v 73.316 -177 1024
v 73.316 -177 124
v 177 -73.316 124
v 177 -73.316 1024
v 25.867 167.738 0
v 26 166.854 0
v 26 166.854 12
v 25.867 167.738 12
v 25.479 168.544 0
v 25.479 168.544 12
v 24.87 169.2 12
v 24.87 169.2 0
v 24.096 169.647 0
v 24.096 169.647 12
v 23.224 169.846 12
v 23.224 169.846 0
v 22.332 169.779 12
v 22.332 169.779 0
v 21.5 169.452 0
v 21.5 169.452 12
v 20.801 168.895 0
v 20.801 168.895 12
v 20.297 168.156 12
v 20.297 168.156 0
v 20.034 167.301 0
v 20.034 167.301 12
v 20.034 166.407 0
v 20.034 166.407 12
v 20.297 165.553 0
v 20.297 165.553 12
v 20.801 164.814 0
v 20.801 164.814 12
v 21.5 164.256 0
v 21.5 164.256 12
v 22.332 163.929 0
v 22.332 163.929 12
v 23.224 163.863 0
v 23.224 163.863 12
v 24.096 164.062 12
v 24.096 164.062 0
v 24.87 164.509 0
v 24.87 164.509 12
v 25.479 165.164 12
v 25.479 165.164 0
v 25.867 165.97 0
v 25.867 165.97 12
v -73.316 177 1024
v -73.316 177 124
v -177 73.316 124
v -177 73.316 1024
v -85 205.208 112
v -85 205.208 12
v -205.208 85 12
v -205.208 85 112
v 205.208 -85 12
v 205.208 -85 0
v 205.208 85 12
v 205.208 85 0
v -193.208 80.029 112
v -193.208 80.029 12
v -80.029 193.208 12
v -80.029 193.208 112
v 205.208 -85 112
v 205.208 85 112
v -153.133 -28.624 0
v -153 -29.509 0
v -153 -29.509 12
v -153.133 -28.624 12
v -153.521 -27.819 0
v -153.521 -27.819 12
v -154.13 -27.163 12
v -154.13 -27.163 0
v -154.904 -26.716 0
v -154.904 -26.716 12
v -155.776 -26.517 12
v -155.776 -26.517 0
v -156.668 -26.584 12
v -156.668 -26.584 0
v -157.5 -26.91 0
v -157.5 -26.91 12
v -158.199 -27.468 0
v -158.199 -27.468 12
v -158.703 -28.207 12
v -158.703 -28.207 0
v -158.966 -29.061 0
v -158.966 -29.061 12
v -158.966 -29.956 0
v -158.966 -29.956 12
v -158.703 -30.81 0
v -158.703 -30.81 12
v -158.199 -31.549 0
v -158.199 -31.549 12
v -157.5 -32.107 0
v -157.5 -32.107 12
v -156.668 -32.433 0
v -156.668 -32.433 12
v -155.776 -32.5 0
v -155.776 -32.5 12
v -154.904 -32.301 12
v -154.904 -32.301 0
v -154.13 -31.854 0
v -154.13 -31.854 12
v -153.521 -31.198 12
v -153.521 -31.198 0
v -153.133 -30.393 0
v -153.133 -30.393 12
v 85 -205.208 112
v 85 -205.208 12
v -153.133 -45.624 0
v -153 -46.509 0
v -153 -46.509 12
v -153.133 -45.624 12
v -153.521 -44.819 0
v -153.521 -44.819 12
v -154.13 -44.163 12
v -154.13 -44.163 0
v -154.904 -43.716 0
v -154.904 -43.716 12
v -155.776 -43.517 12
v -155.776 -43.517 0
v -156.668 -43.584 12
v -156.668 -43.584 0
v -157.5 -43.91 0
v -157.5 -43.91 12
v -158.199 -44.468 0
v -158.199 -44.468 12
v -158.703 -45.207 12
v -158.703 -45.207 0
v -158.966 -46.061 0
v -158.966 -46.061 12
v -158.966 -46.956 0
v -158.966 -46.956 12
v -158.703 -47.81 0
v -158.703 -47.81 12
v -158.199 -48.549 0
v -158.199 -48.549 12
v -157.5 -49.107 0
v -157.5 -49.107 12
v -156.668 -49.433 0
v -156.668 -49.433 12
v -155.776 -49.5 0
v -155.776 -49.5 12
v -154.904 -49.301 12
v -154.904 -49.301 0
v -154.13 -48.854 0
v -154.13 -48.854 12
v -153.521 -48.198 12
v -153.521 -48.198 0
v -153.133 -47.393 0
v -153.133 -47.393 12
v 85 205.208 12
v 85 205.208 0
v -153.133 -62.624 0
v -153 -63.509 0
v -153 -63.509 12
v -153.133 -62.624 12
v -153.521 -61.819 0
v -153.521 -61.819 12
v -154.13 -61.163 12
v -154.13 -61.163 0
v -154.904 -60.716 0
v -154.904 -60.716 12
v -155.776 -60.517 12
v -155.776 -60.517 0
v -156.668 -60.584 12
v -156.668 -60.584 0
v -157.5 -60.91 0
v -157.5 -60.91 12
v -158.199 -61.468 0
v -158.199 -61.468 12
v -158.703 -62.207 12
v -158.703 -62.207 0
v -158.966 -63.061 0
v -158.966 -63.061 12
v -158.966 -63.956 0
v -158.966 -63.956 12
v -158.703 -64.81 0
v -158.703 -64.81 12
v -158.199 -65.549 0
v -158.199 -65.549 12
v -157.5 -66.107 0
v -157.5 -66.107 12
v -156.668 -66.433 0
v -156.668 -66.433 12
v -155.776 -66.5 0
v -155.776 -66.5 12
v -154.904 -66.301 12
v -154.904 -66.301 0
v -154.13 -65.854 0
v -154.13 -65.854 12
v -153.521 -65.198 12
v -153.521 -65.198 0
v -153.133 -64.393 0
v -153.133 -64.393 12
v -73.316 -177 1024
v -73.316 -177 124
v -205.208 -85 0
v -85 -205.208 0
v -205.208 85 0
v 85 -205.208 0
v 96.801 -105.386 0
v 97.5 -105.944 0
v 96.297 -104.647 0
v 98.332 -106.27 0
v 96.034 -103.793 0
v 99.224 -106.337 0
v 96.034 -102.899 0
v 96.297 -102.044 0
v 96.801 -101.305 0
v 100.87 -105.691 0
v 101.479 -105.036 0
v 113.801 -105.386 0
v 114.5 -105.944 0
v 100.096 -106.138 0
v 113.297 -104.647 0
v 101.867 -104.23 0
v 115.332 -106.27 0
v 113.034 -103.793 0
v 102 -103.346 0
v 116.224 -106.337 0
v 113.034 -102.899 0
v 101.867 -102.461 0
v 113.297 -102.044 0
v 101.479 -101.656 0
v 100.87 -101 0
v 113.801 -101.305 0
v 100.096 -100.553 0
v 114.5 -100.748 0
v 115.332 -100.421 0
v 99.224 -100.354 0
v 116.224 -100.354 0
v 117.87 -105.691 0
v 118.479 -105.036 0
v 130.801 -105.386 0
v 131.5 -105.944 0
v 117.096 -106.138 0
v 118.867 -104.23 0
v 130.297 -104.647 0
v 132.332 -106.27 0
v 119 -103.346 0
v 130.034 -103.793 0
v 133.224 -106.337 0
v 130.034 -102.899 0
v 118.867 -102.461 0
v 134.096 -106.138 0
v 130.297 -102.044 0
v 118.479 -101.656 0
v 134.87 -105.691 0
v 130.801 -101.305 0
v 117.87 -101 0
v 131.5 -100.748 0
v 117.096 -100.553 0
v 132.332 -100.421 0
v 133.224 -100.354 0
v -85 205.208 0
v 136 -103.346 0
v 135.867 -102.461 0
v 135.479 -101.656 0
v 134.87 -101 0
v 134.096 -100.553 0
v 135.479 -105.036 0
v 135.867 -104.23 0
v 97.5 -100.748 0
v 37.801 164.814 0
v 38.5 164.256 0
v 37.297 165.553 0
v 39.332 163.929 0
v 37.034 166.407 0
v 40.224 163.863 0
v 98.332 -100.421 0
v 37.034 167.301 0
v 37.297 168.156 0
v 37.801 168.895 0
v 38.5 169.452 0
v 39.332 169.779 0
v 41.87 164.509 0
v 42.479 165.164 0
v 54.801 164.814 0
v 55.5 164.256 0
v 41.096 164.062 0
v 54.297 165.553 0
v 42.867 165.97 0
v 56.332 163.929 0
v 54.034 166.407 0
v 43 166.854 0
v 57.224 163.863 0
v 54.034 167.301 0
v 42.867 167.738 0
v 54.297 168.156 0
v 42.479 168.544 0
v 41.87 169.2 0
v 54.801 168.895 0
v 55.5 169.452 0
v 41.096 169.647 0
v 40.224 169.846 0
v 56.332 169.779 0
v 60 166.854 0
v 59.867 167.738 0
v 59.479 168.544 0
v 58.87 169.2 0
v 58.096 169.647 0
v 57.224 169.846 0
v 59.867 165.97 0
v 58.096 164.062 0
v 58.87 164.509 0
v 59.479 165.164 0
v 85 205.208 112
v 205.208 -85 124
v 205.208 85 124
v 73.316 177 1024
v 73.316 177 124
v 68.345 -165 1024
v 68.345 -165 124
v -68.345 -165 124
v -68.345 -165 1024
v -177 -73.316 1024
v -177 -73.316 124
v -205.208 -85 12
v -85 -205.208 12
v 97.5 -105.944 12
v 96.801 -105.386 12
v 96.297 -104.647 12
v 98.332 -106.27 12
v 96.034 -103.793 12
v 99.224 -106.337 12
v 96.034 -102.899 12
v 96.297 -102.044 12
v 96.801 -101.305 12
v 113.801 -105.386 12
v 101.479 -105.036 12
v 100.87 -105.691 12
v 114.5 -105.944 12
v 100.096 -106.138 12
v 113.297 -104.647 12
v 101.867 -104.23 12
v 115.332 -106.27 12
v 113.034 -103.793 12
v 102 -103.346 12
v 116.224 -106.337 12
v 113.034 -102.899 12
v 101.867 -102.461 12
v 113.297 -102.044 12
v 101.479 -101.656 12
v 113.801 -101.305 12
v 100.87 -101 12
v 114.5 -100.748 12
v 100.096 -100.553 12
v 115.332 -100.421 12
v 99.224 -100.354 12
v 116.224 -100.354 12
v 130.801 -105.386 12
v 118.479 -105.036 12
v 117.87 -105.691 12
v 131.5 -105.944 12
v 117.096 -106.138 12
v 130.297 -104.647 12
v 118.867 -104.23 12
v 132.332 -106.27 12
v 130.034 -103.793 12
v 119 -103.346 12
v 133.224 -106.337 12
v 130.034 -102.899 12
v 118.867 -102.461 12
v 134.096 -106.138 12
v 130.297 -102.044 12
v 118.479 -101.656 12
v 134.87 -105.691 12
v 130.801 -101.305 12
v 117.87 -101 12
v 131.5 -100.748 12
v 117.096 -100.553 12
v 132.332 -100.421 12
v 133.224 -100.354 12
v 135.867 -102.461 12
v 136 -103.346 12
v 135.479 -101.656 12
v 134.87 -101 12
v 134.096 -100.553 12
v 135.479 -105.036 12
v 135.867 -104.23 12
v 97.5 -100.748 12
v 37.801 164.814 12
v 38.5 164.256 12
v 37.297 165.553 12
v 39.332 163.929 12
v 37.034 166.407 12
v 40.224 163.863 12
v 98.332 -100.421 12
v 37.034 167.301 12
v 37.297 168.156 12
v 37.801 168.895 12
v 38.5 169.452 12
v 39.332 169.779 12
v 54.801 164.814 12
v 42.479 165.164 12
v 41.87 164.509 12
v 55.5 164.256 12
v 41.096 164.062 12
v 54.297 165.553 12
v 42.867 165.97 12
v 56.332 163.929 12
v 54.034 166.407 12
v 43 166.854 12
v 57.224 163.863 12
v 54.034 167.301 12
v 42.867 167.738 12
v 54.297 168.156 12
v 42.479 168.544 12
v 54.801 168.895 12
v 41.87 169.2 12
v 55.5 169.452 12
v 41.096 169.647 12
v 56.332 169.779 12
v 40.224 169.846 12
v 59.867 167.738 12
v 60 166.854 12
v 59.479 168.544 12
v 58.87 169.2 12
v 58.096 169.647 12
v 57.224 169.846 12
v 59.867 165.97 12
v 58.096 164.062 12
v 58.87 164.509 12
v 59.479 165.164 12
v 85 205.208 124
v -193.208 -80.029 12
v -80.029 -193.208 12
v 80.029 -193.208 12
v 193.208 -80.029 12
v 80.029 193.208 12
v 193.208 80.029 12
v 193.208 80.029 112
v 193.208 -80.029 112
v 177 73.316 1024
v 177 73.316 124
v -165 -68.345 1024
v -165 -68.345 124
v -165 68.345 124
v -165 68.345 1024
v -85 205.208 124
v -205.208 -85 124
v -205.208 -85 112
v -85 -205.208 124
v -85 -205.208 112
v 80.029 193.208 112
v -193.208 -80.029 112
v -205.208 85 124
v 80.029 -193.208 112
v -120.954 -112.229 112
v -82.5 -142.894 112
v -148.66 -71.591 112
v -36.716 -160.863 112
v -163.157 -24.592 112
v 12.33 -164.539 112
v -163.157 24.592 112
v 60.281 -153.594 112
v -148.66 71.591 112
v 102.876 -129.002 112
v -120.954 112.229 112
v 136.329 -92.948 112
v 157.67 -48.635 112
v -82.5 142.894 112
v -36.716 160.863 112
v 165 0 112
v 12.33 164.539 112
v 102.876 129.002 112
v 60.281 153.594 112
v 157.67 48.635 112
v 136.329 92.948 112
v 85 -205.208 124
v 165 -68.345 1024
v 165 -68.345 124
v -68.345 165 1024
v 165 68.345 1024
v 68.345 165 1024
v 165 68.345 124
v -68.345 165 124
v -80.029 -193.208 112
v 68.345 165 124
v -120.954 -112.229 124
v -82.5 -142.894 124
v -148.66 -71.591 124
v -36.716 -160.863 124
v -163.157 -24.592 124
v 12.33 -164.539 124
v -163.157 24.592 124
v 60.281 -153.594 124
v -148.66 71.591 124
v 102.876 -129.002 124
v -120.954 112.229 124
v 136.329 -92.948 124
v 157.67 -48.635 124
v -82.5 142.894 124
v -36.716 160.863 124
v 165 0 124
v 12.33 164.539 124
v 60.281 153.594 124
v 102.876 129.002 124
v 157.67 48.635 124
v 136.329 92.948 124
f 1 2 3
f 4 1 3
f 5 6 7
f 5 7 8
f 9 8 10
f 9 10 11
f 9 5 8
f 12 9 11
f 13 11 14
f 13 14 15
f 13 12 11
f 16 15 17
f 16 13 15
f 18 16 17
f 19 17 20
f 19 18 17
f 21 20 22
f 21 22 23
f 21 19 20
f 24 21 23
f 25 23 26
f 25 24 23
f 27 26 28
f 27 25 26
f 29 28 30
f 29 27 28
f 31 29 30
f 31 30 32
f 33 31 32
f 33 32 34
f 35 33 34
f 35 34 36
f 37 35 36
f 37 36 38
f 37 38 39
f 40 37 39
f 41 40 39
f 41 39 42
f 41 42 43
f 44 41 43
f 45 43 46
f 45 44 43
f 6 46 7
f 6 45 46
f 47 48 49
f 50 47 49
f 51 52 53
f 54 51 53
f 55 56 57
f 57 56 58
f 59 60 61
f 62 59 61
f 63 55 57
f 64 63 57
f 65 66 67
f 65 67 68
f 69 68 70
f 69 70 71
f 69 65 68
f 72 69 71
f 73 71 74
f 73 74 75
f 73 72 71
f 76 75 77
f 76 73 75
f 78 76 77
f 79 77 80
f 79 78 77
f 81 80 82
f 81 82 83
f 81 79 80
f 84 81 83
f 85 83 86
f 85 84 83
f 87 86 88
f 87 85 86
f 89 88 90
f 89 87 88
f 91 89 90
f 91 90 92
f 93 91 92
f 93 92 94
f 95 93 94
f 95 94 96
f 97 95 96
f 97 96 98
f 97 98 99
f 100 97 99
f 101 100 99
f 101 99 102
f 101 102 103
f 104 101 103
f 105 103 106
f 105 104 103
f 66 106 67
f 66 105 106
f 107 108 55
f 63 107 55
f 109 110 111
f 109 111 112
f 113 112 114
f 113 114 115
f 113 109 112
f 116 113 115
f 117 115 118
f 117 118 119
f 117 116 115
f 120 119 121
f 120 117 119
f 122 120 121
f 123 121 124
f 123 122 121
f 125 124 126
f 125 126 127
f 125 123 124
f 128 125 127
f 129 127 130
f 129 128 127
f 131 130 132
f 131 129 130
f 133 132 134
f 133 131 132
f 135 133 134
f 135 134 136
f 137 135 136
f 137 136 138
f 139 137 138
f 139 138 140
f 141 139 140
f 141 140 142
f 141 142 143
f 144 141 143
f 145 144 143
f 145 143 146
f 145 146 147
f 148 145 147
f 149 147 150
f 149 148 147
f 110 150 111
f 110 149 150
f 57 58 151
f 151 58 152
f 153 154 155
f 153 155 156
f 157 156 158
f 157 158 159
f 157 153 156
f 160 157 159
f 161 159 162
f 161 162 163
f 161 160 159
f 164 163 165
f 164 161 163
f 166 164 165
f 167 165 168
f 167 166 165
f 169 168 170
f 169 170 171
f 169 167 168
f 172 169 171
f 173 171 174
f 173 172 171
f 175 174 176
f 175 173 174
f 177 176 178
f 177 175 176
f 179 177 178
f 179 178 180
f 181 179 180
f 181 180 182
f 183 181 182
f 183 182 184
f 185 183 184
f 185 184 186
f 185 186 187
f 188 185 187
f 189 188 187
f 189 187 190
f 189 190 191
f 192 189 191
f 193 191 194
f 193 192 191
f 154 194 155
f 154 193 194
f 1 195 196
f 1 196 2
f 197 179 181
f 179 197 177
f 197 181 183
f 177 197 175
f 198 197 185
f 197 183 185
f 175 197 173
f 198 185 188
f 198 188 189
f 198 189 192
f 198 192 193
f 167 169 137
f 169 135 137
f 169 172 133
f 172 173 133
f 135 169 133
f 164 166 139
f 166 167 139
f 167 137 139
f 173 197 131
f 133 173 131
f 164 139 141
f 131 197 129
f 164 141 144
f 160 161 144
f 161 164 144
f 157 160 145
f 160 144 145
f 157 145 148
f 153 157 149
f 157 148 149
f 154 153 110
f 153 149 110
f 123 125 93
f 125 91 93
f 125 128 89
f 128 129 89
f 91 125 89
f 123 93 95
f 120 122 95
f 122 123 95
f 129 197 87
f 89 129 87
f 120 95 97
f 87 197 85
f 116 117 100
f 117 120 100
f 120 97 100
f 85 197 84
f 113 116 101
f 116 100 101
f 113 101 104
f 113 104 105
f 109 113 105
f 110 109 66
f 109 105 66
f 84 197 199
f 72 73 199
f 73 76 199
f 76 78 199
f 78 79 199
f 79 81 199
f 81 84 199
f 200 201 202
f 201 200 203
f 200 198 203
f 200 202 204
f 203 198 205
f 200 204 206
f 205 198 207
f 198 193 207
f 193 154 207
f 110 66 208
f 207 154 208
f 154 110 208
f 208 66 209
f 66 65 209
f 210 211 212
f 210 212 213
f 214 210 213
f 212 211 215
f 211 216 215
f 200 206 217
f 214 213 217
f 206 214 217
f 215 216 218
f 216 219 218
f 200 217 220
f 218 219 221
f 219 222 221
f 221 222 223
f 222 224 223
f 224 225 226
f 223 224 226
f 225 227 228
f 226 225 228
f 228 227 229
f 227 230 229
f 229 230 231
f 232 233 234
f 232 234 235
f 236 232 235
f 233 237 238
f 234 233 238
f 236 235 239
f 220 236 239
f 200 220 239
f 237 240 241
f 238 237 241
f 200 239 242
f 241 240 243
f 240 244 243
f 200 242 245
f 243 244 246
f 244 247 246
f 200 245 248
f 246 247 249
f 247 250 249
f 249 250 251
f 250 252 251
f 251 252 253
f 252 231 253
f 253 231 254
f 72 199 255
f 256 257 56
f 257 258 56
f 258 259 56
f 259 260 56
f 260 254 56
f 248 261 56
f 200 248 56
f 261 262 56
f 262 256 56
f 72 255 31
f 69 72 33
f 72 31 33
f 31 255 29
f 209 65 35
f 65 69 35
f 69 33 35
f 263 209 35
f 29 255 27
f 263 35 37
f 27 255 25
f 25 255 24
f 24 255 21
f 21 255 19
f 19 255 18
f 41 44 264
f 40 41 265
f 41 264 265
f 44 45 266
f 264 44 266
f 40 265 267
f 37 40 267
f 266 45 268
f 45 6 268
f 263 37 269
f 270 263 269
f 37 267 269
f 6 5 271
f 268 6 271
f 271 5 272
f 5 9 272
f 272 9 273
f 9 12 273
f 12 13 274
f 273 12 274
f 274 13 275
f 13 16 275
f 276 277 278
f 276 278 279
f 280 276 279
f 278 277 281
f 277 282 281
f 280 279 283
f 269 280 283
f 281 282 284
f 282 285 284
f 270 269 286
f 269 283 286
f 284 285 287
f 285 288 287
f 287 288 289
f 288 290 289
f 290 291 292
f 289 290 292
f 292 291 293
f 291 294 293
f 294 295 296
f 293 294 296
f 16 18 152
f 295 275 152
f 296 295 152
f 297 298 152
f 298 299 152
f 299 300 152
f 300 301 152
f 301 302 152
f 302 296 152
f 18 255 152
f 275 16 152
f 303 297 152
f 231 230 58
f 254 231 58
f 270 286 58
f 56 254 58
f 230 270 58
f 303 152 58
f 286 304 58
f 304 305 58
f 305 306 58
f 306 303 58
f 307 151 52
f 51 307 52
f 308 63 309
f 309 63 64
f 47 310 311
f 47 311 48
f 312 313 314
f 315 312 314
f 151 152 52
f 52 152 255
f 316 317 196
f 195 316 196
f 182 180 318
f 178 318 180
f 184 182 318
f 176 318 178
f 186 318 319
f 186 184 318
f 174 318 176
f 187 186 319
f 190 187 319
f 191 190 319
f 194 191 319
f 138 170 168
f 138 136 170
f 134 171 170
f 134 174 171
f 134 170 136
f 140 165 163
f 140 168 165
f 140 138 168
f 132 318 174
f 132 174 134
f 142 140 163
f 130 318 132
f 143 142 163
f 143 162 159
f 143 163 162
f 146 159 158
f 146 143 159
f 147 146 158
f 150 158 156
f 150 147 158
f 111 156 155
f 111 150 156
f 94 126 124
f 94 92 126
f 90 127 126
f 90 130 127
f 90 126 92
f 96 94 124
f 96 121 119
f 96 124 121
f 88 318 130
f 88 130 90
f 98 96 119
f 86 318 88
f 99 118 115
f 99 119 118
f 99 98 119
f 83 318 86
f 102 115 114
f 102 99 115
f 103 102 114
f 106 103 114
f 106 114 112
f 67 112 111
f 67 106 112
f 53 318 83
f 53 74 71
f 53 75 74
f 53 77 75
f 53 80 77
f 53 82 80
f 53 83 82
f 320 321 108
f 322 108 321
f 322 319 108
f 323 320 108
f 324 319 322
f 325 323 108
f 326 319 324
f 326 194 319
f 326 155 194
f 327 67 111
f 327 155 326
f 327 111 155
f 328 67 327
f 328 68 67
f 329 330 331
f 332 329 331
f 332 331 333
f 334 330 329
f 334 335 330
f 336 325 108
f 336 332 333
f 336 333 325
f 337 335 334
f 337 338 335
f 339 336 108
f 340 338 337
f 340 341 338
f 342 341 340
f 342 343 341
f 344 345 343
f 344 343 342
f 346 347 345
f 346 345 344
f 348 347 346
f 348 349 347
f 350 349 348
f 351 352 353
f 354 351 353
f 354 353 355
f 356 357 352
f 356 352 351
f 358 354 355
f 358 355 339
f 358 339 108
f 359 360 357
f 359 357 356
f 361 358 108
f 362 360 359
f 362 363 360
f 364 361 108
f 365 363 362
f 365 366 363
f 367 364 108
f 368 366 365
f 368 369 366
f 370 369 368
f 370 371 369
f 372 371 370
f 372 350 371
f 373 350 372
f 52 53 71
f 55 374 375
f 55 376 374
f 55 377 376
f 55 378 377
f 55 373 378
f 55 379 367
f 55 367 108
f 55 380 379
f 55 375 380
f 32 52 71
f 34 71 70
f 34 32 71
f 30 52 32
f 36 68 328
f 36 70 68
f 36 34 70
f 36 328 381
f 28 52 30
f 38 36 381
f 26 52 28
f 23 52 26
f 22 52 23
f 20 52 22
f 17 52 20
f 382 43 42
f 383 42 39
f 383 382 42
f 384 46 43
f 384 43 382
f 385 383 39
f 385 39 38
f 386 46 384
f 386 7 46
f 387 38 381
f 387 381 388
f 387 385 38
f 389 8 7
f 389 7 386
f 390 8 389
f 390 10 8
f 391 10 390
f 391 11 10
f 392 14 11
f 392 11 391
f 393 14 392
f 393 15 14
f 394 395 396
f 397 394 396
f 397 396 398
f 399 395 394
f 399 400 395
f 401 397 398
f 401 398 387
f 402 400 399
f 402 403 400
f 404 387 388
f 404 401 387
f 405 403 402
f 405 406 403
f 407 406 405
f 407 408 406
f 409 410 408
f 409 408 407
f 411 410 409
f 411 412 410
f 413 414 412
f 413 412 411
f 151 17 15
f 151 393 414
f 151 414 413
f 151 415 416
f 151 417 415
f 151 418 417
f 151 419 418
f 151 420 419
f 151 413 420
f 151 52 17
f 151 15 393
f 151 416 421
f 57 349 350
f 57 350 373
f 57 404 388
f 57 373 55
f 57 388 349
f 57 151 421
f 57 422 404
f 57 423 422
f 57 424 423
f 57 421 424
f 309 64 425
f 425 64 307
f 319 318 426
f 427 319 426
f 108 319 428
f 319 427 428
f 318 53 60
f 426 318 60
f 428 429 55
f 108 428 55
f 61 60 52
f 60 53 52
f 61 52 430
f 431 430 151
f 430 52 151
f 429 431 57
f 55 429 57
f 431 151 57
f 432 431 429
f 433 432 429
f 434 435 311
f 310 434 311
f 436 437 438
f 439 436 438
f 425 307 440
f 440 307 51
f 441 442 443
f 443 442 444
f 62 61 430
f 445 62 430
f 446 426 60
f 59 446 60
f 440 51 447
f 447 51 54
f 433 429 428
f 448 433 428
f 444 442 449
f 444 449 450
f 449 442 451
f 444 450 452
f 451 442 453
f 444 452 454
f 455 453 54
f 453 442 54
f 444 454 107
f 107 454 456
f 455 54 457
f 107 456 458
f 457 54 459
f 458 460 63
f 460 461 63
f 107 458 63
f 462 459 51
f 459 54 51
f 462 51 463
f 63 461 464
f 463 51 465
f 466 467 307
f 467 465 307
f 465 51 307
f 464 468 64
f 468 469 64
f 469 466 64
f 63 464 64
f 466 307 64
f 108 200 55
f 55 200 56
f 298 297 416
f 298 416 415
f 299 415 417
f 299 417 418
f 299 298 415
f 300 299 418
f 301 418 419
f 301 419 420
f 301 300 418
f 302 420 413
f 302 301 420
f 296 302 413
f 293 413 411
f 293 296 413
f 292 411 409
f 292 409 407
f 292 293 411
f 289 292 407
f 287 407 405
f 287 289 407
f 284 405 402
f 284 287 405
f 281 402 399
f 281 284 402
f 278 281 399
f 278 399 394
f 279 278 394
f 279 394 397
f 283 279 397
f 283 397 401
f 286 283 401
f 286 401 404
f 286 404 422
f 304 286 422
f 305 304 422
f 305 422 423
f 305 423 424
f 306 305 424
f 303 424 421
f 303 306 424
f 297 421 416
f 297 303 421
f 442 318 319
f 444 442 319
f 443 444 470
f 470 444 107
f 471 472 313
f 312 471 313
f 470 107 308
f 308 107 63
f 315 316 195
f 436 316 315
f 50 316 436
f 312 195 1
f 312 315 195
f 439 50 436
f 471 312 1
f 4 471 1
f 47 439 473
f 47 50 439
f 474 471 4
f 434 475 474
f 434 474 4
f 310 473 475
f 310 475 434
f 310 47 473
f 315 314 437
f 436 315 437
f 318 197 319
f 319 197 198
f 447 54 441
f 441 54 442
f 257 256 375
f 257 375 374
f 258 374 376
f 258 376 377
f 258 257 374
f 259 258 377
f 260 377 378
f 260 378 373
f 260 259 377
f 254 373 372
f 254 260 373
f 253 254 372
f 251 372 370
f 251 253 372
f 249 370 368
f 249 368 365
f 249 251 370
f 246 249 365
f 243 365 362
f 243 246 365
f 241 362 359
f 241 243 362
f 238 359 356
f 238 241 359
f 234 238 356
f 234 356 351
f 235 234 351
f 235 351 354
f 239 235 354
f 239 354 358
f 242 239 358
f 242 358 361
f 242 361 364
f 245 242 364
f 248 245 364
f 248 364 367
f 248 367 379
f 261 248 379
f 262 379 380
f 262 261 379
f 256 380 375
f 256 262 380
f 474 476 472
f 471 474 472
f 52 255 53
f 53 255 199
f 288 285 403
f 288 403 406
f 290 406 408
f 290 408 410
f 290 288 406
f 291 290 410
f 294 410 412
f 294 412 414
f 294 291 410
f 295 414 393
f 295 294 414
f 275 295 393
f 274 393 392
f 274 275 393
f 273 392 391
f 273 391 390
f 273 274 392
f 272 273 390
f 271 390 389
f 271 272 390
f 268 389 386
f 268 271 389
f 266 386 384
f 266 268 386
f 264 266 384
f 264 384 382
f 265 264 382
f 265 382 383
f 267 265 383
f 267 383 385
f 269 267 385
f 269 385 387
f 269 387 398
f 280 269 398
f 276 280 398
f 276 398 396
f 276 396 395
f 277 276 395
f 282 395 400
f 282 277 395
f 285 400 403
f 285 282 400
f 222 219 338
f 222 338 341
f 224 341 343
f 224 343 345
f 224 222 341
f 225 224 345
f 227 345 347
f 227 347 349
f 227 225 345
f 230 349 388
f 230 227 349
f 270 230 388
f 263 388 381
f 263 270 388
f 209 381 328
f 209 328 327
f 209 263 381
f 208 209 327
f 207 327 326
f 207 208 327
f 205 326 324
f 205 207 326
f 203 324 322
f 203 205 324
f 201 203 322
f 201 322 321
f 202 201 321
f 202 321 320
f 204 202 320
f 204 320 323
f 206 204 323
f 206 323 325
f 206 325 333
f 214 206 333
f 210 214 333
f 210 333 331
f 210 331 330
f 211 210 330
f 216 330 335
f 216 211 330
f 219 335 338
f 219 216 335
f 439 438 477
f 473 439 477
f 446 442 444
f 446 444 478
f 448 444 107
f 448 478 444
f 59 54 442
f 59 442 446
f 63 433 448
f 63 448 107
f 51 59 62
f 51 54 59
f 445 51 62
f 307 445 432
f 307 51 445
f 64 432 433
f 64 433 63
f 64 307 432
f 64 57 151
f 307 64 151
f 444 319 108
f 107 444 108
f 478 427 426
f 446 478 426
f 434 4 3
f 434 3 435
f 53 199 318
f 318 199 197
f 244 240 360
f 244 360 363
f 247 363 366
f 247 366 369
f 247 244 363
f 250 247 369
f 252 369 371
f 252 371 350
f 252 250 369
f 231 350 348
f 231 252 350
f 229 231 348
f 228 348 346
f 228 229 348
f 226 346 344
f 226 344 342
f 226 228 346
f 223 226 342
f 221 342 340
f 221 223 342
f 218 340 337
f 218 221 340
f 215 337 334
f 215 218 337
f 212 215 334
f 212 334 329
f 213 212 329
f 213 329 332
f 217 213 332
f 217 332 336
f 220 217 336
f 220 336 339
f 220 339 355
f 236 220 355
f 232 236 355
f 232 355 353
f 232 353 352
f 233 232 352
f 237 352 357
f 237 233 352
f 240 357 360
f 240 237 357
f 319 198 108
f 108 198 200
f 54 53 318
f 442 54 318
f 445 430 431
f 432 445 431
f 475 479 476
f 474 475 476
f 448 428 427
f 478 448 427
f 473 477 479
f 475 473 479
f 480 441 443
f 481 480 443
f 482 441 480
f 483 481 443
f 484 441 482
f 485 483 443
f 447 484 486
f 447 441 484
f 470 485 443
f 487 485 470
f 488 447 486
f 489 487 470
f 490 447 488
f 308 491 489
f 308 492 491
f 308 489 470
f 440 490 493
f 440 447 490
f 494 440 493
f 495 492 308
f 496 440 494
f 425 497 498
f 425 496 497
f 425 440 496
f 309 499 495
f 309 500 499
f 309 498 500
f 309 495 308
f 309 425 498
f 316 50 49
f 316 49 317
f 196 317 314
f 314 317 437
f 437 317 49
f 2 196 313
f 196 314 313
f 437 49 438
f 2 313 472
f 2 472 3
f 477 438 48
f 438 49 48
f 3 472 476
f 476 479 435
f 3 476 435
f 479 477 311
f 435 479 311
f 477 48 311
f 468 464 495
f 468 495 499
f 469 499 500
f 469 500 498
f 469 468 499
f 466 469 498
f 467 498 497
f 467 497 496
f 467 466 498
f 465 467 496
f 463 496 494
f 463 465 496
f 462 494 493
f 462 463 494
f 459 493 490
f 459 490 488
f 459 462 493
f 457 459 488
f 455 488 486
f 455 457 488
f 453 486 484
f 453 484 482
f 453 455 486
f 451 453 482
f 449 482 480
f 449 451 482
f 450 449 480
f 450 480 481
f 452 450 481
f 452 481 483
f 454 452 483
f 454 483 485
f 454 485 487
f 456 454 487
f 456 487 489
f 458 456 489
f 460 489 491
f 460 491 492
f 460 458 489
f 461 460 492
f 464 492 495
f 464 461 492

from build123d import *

# Parameters (mm, degrees)
F0_R     = 3
F1_DEPTH = 12
F3_DEPTH = 100
F4_R     = 165
F5_DEPTH = 12
F7_DEPTH = 900


with BuildPart() as f1:
    # F0 (on Top) → F1 (new body)
    with BuildSketch(Plane.XY):
        Polygon((85, 205.208153), (-85, 205.208153), (-205.208153, 85), (-205.208153, -85), (-85, -205.208153), (85, -205.208153), (205.208153, -85), (205.208153, 85), align=None)
        with Locations((-156, -63.50853)):
            Circle(F0_R, mode=Mode.SUBTRACT)
        with Locations((-156, -46.50853)):
            Circle(F0_R, mode=Mode.SUBTRACT)
        with Locations((-156, -29.50853)):
            Circle(F0_R, mode=Mode.SUBTRACT)
        with Locations((99, -103.345698)):
            Circle(F0_R, mode=Mode.SUBTRACT)
        with Locations((116, -103.345698)):
            Circle(F0_R, mode=Mode.SUBTRACT)
        with Locations((133, -103.345698)):
            Circle(F0_R, mode=Mode.SUBTRACT)
        with Locations((23, 166.854228)):
            Circle(F0_R, mode=Mode.SUBTRACT)
        with Locations((40, 166.854228)):
            Circle(F0_R, mode=Mode.SUBTRACT)
        with Locations((57, 166.854228)):
            Circle(F0_R, mode=Mode.SUBTRACT)
    extrude(amount=F1_DEPTH)


with BuildPart() as f3:
    # F2 (on face) → F3 (new body)
    with BuildSketch(Plane.XY.offset(12)):
        Polygon((-85, 205.208153), (-205.208153, 85), (-205.208153, -85), (-85, -205.208153), (85, -205.208153), (205.208153, -85), (205.208153, 85), (85, 205.208153), align=None)
        Polygon((80.029437, -193.208153), (-80.029437, -193.208153), (-193.208153, -80.029437), (-193.208153, 80.029437), (-80.029437, 193.208153), (80.029437, 193.208153), (193.208153, 80.029437), (193.208153, -80.029437), align=None, mode=Mode.SUBTRACT)
    extrude(amount=F3_DEPTH)


with BuildPart() as f5:
    # F4 (on face) → F5 (new body)
    with BuildSketch(Plane.XY.offset(112)):
        Polygon((205.208153, 85), (85, 205.208153), (-85, 205.208153), (-205.208153, 85), (-205.208153, -85), (-85, -205.208153), (85, -205.208153), (205.208153, -85), align=None)
        Circle(F4_R, mode=Mode.SUBTRACT)
    extrude(amount=F5_DEPTH)


with BuildPart() as f7:
    # F6 (on face) → F7 (new body)
    with BuildSketch(Plane.XY.offset(124)):
        Polygon((-165, 68.345238), (-68.345238, 165), (-56.345238, 177), (-73.315801, 177), (-165, 85.315801), align=None)
        Polygon((-56.345238, 177), (-68.345238, 165), (68.345238, 165), (165, 68.345238), (165, -68.345238), (68.345238, -165), (-68.345238, -165), (-165, -68.345238), (-165, 68.345238), (-165, 85.315801), (-177, 73.315801), (-177, -73.315801), (-73.315801, -177), (73.315801, -177), (177, -73.315801), (177, 73.315801), (73.315801, 177), align=None)
    extrude(amount=F7_DEPTH)


solid = Compound([f1.part, f3.part, f5.part, f7.part])
